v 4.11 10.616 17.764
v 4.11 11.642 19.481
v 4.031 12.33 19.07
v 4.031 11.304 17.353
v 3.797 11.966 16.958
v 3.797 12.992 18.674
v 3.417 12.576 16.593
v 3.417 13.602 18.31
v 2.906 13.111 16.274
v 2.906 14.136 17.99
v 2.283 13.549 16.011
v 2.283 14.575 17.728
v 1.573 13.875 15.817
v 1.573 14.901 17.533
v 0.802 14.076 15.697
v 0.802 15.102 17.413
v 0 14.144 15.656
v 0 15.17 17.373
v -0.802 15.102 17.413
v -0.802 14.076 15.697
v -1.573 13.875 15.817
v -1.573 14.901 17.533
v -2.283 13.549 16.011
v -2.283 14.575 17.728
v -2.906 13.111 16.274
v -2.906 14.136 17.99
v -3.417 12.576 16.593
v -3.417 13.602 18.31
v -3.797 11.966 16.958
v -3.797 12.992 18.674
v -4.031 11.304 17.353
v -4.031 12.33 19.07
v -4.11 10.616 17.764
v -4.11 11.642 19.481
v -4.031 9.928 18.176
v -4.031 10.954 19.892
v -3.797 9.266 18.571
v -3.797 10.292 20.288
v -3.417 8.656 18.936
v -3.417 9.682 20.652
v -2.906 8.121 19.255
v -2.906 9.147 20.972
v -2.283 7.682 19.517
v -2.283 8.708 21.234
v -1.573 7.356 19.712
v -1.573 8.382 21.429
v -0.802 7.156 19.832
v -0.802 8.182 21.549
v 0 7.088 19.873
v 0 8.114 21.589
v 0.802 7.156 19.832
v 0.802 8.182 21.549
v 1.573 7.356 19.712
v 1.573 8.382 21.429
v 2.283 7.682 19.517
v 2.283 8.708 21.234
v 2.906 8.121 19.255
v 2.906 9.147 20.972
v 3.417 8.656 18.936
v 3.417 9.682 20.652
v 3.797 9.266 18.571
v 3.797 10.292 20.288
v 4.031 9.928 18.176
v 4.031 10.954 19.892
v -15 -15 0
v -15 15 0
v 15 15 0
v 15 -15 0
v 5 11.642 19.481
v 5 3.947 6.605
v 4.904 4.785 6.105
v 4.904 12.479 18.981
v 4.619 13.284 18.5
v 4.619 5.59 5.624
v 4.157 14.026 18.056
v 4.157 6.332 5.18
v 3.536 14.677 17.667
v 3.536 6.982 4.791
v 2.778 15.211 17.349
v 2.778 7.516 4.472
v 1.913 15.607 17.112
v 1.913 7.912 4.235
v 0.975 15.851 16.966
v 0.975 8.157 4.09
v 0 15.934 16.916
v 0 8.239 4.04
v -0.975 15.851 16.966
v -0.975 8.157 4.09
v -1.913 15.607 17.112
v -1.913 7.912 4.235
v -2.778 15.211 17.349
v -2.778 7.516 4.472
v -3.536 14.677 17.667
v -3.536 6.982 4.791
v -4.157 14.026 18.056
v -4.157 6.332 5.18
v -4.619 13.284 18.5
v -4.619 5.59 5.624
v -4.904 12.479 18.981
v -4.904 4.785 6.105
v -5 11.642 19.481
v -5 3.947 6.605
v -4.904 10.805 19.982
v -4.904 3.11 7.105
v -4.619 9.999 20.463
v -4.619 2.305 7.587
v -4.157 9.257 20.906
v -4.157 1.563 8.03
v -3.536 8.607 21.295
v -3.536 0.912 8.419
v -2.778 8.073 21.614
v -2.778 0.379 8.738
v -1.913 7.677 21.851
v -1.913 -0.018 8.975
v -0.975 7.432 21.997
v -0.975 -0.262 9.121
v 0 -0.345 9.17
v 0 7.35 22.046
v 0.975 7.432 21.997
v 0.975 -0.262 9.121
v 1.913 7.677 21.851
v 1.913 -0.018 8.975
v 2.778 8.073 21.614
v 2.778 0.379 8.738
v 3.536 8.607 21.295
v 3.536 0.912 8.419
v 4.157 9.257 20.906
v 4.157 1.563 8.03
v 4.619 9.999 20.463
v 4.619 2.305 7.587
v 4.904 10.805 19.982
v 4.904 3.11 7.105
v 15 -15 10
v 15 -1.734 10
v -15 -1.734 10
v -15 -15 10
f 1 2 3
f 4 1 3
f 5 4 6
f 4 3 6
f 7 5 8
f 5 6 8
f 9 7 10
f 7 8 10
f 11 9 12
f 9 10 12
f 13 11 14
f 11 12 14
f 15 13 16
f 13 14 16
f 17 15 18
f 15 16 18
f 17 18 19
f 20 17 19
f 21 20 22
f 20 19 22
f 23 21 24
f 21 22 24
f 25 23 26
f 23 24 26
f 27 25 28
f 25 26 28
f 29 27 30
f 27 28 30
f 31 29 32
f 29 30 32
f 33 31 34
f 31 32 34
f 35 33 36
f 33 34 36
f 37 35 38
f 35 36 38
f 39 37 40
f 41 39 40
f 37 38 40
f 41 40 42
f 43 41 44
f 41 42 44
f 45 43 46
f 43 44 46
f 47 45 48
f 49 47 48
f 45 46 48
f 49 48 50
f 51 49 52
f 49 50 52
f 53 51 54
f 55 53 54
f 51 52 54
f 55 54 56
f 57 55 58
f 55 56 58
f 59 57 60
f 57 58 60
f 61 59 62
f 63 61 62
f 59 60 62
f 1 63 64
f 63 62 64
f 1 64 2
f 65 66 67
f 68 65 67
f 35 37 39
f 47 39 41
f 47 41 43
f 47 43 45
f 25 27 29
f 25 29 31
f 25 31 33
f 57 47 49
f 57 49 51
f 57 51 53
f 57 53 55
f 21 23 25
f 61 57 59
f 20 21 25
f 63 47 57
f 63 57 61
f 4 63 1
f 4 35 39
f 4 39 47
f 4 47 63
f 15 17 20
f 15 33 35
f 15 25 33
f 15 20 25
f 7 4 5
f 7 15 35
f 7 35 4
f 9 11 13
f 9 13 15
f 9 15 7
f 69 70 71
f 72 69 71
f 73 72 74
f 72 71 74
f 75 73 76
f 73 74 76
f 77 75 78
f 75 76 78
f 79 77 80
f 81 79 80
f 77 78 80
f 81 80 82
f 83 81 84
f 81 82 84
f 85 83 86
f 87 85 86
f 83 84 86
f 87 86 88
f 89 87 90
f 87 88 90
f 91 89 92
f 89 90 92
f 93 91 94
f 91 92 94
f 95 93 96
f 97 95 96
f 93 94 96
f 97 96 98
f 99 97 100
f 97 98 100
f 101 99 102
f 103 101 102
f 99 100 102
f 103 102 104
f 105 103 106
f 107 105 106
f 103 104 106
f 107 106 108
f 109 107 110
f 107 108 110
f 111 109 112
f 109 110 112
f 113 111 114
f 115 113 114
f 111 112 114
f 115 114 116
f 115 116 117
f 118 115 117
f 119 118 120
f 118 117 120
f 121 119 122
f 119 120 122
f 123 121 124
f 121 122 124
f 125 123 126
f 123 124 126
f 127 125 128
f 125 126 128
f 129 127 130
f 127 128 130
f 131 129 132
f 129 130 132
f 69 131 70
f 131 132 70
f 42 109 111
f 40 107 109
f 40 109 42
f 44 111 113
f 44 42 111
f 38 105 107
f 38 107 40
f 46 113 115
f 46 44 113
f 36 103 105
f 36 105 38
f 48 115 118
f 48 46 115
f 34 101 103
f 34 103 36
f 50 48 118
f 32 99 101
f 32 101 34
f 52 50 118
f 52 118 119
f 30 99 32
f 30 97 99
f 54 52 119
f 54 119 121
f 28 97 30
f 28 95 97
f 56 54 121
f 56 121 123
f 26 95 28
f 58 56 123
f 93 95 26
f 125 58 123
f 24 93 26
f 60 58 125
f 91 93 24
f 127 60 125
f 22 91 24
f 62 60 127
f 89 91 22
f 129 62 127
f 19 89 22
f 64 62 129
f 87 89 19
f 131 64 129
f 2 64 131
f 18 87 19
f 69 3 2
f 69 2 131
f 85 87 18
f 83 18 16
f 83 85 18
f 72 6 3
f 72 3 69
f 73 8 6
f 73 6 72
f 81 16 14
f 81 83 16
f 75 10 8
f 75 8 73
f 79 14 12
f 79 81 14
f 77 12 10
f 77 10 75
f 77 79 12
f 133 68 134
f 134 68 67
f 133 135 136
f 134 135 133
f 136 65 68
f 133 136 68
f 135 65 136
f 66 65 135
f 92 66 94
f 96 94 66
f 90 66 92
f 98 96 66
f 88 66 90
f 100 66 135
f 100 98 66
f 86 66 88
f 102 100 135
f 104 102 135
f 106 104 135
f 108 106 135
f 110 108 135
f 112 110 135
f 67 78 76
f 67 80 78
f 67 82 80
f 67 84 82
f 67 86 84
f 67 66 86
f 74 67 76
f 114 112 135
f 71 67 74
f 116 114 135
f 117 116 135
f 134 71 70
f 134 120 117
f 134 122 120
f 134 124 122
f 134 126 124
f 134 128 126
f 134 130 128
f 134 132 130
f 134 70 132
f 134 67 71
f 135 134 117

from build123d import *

# Parameters (mm, degrees)
SKETCH2_W           = 30
SKETCH2_H           = 30
BOSS_EXTRUDE2_DEPTH = 10
CUT_EXTRUDE2_DEPTH  = 36
SKETCH6_R           = 5
BOSS_EXTRUDE3_DEPTH = 15
SKETCH7_R           = 4.109940847
CUT_EXTRUDE3_DEPTH  = 2


with BuildPart() as part:
    # Sketch2 → Boss-Extrude2 (new body)
    with BuildSketch(Plane.XY):
        Rectangle(SKETCH2_W, SKETCH2_H)
    extrude(amount=BOSS_EXTRUDE2_DEPTH)

    # Sketch5 → Cut-Extrude2 (cut)
    with BuildSketch(Plane(origin=(15, 0, 0), x_dir=(0, 0, -1), z_dir=(1, 0, 0))):
        Polygon((0, 15), (-10, -1.73373583), (-10, 15), align=None)
    extrude(amount=-CUT_EXTRUDE2_DEPTH, mode=Mode.SUBTRACT)

    # Sketch6 → Boss-Extrude3 (add)
    with BuildSketch(Plane(origin=(0, 3.947182334, 6.605110645), x_dir=(1, 0, 0), z_dir=(0, 0.512977084, 0.858402301))):
        Circle(SKETCH6_R)
    extrude(amount=BOSS_EXTRUDE3_DEPTH)

    # Sketch7 → Cut-Extrude3 (cut)
    with BuildSketch(Plane(origin=(0, 11.641838597, 19.481145166), x_dir=(1, 0, 0), z_dir=(0, 0.512977084, 0.858402301))):
        Circle(SKETCH7_R)
    extrude(amount=-CUT_EXTRUDE3_DEPTH, mode=Mode.SUBTRACT)


solid = part.part
